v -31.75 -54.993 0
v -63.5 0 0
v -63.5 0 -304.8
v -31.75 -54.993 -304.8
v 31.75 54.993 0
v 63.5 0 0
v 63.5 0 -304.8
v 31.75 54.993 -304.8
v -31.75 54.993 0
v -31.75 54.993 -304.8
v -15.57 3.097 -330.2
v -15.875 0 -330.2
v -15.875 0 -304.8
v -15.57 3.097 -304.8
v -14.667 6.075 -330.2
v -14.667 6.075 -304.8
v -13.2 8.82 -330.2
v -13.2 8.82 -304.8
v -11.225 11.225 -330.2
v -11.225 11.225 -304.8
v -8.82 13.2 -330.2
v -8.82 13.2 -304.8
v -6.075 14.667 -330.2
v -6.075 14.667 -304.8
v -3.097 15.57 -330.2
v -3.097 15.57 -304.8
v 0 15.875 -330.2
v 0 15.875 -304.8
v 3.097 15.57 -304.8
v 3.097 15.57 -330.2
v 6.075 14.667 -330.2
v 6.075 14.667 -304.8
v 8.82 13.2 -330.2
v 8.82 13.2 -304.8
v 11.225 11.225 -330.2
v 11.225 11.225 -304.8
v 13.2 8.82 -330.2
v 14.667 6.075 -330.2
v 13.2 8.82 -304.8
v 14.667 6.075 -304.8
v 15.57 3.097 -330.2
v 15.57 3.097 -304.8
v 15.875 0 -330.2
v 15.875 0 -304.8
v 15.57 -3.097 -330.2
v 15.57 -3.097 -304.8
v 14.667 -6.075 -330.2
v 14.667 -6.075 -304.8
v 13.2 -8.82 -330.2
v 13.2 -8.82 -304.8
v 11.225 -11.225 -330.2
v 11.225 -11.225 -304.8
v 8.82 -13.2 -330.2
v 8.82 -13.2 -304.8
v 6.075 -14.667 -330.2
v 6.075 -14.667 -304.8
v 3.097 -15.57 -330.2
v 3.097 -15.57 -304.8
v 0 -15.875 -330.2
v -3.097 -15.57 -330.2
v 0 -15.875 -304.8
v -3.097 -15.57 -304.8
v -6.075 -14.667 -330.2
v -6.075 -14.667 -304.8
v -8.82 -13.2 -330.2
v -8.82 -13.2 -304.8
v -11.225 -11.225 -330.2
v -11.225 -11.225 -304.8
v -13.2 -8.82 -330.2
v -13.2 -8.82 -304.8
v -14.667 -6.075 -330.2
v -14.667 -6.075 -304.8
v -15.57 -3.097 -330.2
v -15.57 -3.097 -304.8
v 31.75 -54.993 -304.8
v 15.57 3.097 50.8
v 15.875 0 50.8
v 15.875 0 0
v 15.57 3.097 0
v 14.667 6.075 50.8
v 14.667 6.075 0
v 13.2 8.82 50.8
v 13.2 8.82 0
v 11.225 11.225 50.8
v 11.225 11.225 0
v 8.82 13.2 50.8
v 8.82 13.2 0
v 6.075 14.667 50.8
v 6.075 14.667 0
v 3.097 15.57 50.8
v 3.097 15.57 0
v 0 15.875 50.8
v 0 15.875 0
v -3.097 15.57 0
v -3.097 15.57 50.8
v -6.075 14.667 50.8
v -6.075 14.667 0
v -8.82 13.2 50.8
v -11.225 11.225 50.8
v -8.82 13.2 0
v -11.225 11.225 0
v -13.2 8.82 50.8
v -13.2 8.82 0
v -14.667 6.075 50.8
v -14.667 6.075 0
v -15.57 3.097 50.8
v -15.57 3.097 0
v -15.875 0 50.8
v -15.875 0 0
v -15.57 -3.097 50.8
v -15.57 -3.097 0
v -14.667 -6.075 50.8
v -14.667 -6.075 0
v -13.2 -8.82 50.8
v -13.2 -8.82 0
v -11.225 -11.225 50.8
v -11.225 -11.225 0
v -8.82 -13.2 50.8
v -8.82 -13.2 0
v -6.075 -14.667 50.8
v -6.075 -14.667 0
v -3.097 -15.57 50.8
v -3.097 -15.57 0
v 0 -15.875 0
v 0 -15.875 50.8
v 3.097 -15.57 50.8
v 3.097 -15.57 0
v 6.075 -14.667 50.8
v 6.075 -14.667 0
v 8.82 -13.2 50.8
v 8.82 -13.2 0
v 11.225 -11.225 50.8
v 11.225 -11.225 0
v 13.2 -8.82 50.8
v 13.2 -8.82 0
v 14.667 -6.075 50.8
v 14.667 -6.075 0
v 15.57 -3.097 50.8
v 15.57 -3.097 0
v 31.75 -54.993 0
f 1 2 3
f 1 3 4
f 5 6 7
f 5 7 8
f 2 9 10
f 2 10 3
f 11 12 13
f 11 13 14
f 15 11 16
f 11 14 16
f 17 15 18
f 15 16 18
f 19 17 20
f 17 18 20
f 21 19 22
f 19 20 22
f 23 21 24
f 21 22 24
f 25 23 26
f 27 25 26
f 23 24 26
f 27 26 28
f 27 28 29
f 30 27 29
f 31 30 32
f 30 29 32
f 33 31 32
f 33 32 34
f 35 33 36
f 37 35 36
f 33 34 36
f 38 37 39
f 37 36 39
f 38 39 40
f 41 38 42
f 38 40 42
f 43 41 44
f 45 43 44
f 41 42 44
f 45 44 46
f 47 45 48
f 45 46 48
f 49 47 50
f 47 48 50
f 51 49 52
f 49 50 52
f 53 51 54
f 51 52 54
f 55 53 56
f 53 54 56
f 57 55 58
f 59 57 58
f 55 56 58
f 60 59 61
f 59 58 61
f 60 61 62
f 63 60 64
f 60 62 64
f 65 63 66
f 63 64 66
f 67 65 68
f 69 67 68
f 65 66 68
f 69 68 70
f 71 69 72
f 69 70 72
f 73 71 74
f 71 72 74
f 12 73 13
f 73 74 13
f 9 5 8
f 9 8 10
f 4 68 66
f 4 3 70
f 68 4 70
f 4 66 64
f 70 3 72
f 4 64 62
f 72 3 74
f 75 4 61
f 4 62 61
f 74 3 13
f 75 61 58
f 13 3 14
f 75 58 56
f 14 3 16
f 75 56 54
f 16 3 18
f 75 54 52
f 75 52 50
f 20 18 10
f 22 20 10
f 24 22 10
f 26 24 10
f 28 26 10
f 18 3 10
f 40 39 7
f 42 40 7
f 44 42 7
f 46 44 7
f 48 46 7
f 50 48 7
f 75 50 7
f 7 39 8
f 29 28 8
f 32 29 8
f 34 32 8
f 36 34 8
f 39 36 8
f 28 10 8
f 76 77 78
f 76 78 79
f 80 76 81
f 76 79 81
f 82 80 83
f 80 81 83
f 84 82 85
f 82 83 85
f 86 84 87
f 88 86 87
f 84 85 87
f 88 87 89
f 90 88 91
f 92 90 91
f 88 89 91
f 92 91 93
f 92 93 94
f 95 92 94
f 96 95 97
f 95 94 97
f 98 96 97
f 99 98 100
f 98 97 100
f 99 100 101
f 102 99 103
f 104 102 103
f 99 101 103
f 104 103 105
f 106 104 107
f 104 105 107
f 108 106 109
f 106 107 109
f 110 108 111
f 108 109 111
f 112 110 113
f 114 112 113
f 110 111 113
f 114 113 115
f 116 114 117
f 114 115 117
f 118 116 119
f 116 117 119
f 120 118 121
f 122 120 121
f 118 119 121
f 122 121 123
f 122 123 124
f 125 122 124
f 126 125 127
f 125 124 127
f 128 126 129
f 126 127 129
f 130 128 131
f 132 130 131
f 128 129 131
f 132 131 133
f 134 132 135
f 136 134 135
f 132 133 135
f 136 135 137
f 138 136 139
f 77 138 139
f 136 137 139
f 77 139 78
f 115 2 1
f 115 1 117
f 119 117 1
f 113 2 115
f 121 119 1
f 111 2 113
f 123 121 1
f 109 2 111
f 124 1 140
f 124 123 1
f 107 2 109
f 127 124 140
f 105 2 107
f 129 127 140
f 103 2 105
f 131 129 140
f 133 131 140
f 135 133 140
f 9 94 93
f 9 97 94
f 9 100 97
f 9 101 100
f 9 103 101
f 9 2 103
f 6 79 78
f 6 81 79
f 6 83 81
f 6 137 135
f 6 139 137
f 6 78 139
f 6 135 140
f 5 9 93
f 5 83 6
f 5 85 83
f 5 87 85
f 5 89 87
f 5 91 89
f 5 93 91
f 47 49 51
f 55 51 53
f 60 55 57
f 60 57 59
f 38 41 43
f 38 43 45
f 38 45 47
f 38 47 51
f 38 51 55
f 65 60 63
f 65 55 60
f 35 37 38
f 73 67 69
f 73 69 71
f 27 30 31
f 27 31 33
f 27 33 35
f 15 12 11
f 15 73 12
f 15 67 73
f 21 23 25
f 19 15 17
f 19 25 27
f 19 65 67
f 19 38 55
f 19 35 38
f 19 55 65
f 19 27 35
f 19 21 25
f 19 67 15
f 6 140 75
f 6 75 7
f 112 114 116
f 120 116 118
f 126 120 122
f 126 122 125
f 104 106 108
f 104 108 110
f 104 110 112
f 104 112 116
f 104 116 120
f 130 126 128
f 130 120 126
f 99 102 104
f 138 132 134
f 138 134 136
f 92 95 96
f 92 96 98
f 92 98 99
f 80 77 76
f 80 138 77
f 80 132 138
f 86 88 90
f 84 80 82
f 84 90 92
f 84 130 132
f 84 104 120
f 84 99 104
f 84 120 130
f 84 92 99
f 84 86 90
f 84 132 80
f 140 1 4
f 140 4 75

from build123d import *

# Parameters (mm, degrees)
SALIENTE_EXTRUIR1_DEPTH = 304.8
CROQUIS4_R              = 15.875
SALIENTE_EXTRUIR2_DEPTH = 50.8
CROQUIS5_R              = 15.875
SALIENTE_EXTRUIR3_DEPTH = 25.4


with BuildPart() as part:
    # Croquis2 → Saliente-Extruir1 (new body)
    with BuildSketch(Plane.XY):
        Polygon((-63.5, 0), (-31.75, -54.99261314), (31.75, -54.99261314), (63.5, 0), (31.75, 54.99261314), (-31.75, 54.99261314), align=None)
    extrude(amount=-SALIENTE_EXTRUIR1_DEPTH)

    # Croquis4 → Saliente-Extruir2 (add)
    with BuildSketch(Plane.XY):
        Circle(CROQUIS4_R)
    extrude(amount=SALIENTE_EXTRUIR2_DEPTH)

    # Croquis5 → Saliente-Extruir3 (add)
    with BuildSketch(Plane(origin=(0, 0, -304.8), x_dir=(-1, 0, 0), z_dir=(0, 0, -1))):
        Circle(CROQUIS5_R)
    extrude(amount=SALIENTE_EXTRUIR3_DEPTH)


solid = part.part
